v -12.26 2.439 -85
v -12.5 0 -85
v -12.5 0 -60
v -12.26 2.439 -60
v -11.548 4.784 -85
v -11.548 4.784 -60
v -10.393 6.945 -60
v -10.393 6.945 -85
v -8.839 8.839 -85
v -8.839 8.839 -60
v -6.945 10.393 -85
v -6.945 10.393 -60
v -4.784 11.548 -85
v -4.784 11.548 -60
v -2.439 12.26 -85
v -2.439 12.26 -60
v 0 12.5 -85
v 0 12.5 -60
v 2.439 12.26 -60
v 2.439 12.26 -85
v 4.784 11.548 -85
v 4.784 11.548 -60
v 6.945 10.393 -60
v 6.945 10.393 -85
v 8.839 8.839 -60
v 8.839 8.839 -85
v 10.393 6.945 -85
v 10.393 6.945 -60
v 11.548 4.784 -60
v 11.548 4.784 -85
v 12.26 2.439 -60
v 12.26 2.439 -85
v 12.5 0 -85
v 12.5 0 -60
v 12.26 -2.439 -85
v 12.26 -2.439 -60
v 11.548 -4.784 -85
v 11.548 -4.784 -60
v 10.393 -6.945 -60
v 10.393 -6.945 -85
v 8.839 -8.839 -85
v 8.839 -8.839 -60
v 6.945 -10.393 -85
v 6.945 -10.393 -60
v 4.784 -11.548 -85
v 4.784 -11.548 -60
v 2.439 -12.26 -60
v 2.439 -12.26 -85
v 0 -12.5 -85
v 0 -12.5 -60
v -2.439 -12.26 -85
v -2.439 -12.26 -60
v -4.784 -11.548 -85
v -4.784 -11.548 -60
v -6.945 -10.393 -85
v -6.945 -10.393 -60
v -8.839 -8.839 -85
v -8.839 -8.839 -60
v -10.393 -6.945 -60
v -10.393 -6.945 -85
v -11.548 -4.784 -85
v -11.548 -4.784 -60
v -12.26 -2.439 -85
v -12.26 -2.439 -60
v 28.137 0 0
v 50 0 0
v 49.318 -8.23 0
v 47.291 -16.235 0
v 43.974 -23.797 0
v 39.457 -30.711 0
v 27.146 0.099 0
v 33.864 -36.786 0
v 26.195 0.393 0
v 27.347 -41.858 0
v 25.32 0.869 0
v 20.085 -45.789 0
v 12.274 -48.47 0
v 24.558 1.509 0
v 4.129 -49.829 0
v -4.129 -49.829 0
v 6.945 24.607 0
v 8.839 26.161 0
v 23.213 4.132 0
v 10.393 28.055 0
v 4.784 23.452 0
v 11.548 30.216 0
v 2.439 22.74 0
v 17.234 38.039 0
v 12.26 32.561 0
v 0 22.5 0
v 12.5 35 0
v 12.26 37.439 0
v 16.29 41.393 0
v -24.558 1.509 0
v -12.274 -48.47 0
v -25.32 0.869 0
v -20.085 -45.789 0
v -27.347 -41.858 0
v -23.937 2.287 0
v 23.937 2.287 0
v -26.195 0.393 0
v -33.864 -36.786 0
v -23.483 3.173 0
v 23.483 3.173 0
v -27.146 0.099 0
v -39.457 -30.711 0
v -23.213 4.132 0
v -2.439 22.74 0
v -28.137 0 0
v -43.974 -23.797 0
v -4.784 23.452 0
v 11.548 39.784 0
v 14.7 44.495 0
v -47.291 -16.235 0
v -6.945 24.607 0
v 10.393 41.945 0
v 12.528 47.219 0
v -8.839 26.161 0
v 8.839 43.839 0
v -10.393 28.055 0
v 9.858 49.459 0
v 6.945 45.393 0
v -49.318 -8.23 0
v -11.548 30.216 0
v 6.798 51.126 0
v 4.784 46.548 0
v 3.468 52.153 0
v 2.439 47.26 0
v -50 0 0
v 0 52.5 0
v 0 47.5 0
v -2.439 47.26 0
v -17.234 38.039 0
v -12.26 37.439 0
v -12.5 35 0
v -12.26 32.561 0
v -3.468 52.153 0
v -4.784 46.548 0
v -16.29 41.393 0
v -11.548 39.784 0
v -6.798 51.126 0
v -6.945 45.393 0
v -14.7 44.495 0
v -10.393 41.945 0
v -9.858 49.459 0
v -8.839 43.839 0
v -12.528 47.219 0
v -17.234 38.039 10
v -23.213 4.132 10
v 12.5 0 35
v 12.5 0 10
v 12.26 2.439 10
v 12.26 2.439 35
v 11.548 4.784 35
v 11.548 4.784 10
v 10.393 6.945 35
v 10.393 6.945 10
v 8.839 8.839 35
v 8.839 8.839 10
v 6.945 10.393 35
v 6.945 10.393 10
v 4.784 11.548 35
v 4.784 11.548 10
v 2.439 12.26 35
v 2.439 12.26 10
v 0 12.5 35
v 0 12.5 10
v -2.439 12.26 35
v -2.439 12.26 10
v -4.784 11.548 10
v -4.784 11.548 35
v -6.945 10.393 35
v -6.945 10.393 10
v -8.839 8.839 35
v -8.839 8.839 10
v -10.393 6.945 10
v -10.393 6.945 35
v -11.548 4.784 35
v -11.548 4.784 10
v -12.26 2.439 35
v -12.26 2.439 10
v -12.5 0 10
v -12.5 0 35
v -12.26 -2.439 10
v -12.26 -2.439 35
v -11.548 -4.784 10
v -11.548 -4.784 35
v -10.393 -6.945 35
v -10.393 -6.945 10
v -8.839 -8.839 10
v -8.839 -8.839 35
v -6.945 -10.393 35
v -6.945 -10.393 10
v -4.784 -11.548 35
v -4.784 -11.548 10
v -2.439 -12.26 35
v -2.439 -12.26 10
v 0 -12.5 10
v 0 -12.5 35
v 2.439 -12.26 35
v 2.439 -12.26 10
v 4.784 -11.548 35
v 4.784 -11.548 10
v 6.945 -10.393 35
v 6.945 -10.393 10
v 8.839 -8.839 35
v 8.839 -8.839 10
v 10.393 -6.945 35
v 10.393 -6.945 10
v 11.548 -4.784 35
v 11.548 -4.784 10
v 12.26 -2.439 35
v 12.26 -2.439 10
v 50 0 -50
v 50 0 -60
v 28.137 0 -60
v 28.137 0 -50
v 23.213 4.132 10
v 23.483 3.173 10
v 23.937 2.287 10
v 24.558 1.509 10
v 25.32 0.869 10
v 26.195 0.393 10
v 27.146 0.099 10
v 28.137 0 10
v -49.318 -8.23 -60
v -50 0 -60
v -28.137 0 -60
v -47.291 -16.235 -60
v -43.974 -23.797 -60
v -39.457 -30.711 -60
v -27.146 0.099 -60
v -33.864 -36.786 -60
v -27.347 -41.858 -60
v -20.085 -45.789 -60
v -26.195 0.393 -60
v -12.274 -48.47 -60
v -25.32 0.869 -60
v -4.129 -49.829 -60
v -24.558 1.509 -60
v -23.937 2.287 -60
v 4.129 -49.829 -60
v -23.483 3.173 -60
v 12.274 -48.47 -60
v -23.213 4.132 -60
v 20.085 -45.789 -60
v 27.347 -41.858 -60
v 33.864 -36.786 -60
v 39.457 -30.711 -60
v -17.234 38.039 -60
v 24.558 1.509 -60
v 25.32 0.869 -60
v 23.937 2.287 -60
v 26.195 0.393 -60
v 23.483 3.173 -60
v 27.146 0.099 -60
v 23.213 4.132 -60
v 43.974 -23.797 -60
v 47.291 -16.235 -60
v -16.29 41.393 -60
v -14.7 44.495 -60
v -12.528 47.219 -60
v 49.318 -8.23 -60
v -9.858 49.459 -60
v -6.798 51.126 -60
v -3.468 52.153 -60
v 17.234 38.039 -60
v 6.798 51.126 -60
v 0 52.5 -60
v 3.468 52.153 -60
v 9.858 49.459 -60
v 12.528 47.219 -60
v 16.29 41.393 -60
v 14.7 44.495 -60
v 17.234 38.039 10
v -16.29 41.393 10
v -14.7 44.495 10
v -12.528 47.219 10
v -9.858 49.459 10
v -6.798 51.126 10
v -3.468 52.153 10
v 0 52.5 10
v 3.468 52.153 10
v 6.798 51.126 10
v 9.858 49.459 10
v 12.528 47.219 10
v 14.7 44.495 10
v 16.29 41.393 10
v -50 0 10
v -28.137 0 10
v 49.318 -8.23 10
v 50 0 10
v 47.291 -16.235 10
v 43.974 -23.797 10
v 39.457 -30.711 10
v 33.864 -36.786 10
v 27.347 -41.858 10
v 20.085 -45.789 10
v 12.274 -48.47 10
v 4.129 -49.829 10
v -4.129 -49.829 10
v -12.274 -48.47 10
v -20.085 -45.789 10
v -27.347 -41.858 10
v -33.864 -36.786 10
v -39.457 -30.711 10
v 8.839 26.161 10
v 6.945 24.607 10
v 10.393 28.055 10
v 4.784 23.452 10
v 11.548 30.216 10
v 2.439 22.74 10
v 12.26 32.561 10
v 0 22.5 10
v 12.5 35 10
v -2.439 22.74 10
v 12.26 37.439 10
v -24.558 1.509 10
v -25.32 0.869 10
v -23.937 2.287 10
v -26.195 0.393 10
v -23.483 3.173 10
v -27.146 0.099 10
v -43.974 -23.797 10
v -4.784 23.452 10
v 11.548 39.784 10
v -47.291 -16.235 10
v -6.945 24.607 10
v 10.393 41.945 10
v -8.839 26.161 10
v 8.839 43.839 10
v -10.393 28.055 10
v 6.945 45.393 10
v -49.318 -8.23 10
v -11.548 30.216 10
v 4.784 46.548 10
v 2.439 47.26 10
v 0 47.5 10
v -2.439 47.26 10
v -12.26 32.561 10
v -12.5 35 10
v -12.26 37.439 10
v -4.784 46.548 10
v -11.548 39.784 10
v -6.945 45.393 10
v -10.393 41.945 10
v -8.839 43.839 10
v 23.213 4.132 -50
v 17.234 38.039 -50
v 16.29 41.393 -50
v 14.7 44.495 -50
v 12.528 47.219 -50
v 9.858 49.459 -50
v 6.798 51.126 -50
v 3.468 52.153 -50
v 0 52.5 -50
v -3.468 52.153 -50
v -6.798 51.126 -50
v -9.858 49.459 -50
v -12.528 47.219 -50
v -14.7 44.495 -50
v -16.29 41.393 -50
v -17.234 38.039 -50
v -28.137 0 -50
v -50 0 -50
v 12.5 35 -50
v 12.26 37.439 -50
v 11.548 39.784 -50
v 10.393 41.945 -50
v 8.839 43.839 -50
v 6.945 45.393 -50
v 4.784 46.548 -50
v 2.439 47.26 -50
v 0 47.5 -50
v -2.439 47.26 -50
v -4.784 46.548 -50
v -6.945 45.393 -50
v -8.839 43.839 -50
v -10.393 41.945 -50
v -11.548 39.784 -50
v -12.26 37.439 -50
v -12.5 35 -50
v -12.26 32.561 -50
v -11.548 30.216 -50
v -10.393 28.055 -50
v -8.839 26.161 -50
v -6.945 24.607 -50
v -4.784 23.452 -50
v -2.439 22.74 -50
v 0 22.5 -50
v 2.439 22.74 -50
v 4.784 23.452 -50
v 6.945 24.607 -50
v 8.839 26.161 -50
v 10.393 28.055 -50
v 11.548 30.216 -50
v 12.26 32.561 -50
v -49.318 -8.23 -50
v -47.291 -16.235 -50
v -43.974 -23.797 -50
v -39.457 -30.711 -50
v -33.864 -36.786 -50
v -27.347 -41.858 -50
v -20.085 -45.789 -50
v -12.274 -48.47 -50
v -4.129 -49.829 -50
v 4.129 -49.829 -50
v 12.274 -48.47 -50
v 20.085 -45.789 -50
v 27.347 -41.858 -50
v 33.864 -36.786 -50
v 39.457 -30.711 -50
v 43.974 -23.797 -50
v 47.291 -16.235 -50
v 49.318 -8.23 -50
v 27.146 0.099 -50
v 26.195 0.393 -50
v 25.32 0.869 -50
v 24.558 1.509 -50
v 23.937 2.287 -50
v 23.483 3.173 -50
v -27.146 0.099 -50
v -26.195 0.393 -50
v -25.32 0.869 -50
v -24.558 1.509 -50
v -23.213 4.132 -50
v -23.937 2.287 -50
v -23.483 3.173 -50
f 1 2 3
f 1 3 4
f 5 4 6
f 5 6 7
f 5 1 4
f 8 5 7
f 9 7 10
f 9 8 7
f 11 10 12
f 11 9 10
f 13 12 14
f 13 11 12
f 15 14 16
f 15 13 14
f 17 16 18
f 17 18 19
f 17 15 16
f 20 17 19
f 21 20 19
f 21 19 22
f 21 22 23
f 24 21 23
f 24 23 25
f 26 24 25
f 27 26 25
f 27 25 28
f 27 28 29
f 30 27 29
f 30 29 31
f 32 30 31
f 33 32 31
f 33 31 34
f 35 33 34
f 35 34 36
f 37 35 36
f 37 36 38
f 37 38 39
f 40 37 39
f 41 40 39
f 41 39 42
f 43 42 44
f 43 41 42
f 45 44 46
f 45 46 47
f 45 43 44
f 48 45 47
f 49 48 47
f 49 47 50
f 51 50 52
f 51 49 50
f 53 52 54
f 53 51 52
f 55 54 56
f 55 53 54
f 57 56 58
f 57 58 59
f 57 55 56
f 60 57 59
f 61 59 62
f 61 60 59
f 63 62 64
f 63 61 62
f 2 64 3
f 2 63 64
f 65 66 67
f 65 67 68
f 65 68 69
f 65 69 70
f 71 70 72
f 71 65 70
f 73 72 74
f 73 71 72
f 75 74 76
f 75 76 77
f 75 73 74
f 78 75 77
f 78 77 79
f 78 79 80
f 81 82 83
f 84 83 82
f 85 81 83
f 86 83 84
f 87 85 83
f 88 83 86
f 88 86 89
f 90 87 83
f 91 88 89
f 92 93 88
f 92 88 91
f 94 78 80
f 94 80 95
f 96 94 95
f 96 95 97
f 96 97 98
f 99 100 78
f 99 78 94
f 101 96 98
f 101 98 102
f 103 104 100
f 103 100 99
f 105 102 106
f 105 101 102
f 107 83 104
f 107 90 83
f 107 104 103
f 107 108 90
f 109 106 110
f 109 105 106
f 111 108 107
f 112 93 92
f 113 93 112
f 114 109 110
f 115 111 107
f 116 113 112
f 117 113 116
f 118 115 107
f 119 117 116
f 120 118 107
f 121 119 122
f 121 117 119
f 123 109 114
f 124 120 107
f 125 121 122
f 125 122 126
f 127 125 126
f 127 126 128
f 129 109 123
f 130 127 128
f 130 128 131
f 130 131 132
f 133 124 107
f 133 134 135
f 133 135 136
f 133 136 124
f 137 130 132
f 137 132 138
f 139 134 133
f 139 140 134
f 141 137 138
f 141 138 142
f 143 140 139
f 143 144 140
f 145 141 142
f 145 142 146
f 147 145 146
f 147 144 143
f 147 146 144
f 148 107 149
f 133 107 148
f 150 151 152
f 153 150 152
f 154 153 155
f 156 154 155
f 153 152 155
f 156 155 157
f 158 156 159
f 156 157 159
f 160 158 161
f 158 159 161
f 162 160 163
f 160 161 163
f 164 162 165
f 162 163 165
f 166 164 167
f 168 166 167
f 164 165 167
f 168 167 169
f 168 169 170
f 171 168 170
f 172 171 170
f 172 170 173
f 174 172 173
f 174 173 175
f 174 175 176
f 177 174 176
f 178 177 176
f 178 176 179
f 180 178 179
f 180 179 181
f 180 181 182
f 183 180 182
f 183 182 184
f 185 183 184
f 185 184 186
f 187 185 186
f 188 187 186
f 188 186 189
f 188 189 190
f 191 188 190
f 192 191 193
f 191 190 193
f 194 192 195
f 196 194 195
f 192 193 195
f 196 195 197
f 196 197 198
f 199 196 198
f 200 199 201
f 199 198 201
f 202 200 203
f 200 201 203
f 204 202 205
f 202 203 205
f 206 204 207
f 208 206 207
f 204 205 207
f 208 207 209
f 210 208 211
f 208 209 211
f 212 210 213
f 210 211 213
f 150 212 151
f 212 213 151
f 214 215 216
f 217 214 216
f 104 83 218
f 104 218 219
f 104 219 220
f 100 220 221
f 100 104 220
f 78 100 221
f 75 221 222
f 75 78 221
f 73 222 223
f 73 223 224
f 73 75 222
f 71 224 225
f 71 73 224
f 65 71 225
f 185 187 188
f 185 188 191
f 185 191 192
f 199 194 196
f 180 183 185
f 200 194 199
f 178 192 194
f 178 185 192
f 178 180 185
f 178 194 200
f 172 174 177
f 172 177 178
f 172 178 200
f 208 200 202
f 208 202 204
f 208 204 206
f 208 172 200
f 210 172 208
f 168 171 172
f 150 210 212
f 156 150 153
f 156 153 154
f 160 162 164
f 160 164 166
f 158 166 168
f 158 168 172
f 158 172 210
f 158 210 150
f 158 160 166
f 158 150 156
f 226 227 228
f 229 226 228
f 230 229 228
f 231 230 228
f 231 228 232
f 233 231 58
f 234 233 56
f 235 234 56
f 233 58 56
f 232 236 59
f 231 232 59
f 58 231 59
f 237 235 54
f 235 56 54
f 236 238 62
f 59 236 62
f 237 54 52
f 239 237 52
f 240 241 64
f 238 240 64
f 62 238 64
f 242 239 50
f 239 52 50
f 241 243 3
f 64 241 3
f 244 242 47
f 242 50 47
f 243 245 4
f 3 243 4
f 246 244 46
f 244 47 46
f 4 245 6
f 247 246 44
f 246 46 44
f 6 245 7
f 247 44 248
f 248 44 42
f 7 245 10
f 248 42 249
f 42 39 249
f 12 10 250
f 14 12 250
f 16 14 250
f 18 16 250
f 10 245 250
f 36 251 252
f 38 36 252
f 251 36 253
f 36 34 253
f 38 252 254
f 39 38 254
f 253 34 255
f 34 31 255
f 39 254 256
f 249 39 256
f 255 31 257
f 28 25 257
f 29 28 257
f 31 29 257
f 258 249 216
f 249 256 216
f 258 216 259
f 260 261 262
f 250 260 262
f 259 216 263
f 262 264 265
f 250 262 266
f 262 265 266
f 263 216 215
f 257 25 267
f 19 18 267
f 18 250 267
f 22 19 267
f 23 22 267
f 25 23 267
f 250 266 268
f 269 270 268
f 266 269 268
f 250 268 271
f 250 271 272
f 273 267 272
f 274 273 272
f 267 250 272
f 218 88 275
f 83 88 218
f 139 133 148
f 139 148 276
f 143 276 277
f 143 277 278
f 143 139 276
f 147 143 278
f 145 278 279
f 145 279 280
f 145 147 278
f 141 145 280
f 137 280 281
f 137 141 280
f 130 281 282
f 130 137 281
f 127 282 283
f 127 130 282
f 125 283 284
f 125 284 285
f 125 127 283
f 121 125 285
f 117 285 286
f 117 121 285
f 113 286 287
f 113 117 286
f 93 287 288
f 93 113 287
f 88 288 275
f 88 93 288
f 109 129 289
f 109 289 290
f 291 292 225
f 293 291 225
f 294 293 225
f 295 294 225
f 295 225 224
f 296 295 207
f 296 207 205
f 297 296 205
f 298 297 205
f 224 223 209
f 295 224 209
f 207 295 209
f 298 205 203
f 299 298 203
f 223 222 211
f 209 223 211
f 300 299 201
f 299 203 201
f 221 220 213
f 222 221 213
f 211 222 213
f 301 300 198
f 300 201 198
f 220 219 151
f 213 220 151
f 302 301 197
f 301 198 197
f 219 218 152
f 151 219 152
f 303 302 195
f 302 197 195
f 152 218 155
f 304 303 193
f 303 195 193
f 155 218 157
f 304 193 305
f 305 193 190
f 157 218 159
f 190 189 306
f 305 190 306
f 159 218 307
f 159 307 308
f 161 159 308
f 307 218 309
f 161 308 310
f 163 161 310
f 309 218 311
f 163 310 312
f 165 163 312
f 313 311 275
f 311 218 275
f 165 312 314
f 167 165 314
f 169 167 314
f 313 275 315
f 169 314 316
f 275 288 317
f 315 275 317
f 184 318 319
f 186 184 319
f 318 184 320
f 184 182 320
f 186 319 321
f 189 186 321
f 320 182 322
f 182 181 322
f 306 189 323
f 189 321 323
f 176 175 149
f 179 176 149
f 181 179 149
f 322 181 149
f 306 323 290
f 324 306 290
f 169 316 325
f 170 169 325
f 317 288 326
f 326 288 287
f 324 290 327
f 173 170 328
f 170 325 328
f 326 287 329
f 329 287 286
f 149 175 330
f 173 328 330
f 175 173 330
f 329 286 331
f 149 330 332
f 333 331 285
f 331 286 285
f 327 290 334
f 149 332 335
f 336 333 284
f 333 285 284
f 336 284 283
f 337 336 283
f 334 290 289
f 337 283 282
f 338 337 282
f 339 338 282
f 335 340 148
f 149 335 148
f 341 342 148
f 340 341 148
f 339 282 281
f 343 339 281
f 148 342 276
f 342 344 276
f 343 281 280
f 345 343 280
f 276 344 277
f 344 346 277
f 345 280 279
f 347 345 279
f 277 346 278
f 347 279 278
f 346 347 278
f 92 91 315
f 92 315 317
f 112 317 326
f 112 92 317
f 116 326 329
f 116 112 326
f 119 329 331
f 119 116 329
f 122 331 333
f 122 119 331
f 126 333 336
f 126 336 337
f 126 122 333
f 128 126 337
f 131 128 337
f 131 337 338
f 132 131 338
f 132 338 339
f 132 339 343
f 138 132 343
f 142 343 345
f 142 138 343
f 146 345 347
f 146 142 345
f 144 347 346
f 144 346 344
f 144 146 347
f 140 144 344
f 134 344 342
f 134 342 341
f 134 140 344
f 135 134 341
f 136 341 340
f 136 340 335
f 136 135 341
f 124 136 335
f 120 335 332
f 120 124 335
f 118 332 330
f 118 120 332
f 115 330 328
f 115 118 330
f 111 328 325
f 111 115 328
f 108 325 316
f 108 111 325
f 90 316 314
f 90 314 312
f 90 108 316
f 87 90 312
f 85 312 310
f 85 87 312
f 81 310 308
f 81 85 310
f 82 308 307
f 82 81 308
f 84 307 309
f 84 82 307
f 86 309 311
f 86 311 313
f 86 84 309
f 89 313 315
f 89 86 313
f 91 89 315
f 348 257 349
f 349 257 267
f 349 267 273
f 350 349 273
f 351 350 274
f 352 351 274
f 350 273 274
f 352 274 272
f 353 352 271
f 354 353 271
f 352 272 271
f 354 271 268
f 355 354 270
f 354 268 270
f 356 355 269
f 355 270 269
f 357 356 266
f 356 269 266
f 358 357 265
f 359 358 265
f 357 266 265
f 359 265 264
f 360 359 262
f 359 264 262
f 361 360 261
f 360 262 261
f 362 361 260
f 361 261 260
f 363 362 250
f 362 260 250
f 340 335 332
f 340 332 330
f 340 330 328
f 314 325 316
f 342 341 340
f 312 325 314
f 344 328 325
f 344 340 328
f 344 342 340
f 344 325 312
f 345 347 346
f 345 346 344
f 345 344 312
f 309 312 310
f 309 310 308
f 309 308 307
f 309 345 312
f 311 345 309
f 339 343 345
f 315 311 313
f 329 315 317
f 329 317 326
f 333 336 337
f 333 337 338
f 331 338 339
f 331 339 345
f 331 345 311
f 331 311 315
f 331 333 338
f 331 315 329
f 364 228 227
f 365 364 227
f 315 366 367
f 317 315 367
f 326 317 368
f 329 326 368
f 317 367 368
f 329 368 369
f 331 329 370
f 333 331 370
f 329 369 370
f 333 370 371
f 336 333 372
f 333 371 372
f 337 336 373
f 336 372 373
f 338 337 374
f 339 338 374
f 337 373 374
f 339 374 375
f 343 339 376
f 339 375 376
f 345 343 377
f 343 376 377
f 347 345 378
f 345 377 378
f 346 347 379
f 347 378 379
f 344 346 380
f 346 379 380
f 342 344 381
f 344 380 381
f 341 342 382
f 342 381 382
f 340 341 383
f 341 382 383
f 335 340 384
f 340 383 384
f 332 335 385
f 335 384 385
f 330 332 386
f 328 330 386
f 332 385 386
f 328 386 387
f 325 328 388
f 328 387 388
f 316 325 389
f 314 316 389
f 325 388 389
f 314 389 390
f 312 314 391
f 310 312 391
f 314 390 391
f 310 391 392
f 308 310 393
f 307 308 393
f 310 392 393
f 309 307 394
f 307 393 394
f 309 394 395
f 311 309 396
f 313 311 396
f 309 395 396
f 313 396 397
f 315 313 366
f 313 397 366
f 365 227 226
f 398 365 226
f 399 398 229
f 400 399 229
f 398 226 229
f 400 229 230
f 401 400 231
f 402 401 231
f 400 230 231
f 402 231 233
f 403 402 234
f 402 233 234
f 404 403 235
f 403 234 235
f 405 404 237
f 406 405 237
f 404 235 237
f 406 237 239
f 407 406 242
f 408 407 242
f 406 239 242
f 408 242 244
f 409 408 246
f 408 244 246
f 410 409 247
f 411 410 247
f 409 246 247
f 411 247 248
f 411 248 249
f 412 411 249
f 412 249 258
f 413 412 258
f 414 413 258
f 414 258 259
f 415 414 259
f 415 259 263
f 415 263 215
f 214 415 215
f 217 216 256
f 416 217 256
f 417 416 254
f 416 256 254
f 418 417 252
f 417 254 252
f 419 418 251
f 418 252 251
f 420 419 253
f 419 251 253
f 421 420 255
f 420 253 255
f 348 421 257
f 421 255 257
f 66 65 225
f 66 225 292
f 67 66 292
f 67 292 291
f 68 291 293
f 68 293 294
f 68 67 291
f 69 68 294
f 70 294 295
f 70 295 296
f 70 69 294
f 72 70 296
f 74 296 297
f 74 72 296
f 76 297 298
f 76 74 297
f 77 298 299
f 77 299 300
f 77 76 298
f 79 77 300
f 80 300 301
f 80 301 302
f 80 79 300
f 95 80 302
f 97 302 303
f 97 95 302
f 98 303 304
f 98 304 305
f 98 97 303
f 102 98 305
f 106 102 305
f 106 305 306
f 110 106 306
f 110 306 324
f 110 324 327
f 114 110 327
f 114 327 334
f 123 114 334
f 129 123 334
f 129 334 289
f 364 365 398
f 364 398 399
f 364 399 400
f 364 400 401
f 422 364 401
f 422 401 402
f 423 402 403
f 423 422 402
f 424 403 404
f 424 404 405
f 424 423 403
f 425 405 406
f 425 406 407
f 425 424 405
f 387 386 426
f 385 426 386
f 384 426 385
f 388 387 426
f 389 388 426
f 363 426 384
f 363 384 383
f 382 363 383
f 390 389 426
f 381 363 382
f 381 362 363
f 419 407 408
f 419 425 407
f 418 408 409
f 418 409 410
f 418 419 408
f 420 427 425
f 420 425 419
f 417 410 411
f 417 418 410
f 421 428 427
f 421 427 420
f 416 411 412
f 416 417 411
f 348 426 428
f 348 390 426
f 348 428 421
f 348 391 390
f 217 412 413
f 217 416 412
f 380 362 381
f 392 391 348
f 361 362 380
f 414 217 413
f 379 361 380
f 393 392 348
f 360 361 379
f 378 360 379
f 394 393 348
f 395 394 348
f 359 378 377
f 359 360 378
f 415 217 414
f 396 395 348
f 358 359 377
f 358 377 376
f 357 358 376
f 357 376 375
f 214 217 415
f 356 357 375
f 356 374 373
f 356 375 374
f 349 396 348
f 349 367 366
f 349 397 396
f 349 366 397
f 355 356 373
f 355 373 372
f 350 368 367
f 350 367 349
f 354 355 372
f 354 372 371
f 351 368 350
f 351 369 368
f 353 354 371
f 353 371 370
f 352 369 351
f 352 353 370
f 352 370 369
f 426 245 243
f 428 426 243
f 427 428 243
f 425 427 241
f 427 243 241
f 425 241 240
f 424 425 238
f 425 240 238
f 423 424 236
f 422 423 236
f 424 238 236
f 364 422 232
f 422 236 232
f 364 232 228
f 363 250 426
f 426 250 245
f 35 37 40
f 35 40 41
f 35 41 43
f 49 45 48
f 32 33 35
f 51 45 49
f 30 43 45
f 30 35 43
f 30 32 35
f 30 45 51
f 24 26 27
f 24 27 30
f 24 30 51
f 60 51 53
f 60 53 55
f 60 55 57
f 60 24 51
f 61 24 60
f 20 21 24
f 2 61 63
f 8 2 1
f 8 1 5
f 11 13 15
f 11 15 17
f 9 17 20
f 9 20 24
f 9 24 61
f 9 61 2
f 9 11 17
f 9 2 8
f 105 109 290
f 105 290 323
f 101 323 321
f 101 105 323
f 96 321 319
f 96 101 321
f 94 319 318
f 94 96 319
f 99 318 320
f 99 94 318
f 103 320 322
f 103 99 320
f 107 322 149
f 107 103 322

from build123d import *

# Parameters (mm, degrees)
SKETCH1_R                = 12.5
BOSS_EXTRUDE1_DEPTH      = 10
BOSS_EXTRUDE2_DEPTH      = 10
BOSS_EXTRUDE2_DEPTH_BACK = 50
SKETCH1_2_R              = 12.5
SKETCH1_3_R              = 12.5
BOSS_EXTRUDE3_DEPTH      = 35
BOSS_EXTRUDE4_START      = 10
SKETCH3_R                = 12.5
BOSS_EXTRUDE4_DEPTH      = 10
BOSS_EXTRUDE5_START      = 35
SKETCH3_3_R              = 12.5
BOSS_EXTRUDE5_DEPTH      = 35


with BuildPart() as part:
    # Sketch1 → Boss-Extrude1 (new body)
    with BuildSketch(Plane.XY):
        with BuildLine():
            Line((-50, 0), (-28.136908189, 0))
            ThreePointArc((-28.136908189, 0), (-24.92297014, 1.169777784), (-23.212869424, 4.131759112))
            Line((-23.212869424, 4.131759112), (-17.234135678, 38.038843109))
            ThreePointArc((-17.234135678, 38.038843109), (0, 52.5), (17.234135678, 38.038843109))
            Line((17.234135678, 38.038843109), (23.212869424, 4.131759112))
            ThreePointArc((23.212869424, 4.131759112), (24.92297014, 1.169777784), (28.136908189, 0))
            Line((28.136908189, 0), (50, 0))
            ThreePointArc((50, 0), (0, -50), (-50, 0))
        make_face()
        Circle(SKETCH1_R, mode=Mode.SUBTRACT)
        with Locations((0, 35)):
            Circle(SKETCH1_R, mode=Mode.SUBTRACT)
    extrude(amount=BOSS_EXTRUDE1_DEPTH)

    # Sketch1<3> → Boss-Extrude3 (add)
    with BuildSketch(Plane.XY):
        Circle(SKETCH1_3_R)
    extrude(amount=BOSS_EXTRUDE3_DEPTH)


with BuildPart() as body_2:
    # Sketch1<2> → Boss-Extrude2 (new, two sides: drawn at the far end of the back side and taken through both)
    with BuildSketch(Plane.XY.offset(-BOSS_EXTRUDE2_DEPTH_BACK)):
        with Locations((0, 35)):
            Circle(SKETCH1_2_R)
    extrude(amount=BOSS_EXTRUDE2_DEPTH + BOSS_EXTRUDE2_DEPTH_BACK)

    # Sketch3 → Boss-Extrude4 (add)
    with BuildSketch(Plane(origin=(0, 0, -50), x_dir=(-1, 0, 0), z_dir=(0, 0, -1)).offset(BOSS_EXTRUDE4_START)):
        with BuildLine():
            ThreePointArc((-50, 0), (0, -50), (50, 0))
            Line((50, 0), (28.136908189, 0))
            ThreePointArc((28.136908189, 0), (24.92297014, 1.169777784), (23.212869424, 4.131759112))
            Line((23.212869424, 4.131759112), (17.234135678, 38.038843109))
            ThreePointArc((17.234135678, 38.038843109), (0, 52.5), (-17.234135678, 38.038843109))
            Line((-17.234135678, 38.038843109), (-23.212869424, 4.131759112))
            ThreePointArc((-23.212869424, 4.131759112), (-24.92297014, 1.169777784), (-28.136908189, 0))
            Line((-28.136908189, 0), (-50, 0))
        make_face()
        Circle(SKETCH3_R, mode=Mode.SUBTRACT)
    extrude(amount=-BOSS_EXTRUDE4_DEPTH)

    # Sketch3<3> → Boss-Extrude5 (add)
    with BuildSketch(Plane(origin=(0, 0, -50), x_dir=(-1, 0, 0), z_dir=(0, 0, -1)).offset(BOSS_EXTRUDE5_START)):
        Circle(SKETCH3_3_R)
    extrude(amount=-BOSS_EXTRUDE5_DEPTH)


solid = Compound([part.part, body_2.part])
